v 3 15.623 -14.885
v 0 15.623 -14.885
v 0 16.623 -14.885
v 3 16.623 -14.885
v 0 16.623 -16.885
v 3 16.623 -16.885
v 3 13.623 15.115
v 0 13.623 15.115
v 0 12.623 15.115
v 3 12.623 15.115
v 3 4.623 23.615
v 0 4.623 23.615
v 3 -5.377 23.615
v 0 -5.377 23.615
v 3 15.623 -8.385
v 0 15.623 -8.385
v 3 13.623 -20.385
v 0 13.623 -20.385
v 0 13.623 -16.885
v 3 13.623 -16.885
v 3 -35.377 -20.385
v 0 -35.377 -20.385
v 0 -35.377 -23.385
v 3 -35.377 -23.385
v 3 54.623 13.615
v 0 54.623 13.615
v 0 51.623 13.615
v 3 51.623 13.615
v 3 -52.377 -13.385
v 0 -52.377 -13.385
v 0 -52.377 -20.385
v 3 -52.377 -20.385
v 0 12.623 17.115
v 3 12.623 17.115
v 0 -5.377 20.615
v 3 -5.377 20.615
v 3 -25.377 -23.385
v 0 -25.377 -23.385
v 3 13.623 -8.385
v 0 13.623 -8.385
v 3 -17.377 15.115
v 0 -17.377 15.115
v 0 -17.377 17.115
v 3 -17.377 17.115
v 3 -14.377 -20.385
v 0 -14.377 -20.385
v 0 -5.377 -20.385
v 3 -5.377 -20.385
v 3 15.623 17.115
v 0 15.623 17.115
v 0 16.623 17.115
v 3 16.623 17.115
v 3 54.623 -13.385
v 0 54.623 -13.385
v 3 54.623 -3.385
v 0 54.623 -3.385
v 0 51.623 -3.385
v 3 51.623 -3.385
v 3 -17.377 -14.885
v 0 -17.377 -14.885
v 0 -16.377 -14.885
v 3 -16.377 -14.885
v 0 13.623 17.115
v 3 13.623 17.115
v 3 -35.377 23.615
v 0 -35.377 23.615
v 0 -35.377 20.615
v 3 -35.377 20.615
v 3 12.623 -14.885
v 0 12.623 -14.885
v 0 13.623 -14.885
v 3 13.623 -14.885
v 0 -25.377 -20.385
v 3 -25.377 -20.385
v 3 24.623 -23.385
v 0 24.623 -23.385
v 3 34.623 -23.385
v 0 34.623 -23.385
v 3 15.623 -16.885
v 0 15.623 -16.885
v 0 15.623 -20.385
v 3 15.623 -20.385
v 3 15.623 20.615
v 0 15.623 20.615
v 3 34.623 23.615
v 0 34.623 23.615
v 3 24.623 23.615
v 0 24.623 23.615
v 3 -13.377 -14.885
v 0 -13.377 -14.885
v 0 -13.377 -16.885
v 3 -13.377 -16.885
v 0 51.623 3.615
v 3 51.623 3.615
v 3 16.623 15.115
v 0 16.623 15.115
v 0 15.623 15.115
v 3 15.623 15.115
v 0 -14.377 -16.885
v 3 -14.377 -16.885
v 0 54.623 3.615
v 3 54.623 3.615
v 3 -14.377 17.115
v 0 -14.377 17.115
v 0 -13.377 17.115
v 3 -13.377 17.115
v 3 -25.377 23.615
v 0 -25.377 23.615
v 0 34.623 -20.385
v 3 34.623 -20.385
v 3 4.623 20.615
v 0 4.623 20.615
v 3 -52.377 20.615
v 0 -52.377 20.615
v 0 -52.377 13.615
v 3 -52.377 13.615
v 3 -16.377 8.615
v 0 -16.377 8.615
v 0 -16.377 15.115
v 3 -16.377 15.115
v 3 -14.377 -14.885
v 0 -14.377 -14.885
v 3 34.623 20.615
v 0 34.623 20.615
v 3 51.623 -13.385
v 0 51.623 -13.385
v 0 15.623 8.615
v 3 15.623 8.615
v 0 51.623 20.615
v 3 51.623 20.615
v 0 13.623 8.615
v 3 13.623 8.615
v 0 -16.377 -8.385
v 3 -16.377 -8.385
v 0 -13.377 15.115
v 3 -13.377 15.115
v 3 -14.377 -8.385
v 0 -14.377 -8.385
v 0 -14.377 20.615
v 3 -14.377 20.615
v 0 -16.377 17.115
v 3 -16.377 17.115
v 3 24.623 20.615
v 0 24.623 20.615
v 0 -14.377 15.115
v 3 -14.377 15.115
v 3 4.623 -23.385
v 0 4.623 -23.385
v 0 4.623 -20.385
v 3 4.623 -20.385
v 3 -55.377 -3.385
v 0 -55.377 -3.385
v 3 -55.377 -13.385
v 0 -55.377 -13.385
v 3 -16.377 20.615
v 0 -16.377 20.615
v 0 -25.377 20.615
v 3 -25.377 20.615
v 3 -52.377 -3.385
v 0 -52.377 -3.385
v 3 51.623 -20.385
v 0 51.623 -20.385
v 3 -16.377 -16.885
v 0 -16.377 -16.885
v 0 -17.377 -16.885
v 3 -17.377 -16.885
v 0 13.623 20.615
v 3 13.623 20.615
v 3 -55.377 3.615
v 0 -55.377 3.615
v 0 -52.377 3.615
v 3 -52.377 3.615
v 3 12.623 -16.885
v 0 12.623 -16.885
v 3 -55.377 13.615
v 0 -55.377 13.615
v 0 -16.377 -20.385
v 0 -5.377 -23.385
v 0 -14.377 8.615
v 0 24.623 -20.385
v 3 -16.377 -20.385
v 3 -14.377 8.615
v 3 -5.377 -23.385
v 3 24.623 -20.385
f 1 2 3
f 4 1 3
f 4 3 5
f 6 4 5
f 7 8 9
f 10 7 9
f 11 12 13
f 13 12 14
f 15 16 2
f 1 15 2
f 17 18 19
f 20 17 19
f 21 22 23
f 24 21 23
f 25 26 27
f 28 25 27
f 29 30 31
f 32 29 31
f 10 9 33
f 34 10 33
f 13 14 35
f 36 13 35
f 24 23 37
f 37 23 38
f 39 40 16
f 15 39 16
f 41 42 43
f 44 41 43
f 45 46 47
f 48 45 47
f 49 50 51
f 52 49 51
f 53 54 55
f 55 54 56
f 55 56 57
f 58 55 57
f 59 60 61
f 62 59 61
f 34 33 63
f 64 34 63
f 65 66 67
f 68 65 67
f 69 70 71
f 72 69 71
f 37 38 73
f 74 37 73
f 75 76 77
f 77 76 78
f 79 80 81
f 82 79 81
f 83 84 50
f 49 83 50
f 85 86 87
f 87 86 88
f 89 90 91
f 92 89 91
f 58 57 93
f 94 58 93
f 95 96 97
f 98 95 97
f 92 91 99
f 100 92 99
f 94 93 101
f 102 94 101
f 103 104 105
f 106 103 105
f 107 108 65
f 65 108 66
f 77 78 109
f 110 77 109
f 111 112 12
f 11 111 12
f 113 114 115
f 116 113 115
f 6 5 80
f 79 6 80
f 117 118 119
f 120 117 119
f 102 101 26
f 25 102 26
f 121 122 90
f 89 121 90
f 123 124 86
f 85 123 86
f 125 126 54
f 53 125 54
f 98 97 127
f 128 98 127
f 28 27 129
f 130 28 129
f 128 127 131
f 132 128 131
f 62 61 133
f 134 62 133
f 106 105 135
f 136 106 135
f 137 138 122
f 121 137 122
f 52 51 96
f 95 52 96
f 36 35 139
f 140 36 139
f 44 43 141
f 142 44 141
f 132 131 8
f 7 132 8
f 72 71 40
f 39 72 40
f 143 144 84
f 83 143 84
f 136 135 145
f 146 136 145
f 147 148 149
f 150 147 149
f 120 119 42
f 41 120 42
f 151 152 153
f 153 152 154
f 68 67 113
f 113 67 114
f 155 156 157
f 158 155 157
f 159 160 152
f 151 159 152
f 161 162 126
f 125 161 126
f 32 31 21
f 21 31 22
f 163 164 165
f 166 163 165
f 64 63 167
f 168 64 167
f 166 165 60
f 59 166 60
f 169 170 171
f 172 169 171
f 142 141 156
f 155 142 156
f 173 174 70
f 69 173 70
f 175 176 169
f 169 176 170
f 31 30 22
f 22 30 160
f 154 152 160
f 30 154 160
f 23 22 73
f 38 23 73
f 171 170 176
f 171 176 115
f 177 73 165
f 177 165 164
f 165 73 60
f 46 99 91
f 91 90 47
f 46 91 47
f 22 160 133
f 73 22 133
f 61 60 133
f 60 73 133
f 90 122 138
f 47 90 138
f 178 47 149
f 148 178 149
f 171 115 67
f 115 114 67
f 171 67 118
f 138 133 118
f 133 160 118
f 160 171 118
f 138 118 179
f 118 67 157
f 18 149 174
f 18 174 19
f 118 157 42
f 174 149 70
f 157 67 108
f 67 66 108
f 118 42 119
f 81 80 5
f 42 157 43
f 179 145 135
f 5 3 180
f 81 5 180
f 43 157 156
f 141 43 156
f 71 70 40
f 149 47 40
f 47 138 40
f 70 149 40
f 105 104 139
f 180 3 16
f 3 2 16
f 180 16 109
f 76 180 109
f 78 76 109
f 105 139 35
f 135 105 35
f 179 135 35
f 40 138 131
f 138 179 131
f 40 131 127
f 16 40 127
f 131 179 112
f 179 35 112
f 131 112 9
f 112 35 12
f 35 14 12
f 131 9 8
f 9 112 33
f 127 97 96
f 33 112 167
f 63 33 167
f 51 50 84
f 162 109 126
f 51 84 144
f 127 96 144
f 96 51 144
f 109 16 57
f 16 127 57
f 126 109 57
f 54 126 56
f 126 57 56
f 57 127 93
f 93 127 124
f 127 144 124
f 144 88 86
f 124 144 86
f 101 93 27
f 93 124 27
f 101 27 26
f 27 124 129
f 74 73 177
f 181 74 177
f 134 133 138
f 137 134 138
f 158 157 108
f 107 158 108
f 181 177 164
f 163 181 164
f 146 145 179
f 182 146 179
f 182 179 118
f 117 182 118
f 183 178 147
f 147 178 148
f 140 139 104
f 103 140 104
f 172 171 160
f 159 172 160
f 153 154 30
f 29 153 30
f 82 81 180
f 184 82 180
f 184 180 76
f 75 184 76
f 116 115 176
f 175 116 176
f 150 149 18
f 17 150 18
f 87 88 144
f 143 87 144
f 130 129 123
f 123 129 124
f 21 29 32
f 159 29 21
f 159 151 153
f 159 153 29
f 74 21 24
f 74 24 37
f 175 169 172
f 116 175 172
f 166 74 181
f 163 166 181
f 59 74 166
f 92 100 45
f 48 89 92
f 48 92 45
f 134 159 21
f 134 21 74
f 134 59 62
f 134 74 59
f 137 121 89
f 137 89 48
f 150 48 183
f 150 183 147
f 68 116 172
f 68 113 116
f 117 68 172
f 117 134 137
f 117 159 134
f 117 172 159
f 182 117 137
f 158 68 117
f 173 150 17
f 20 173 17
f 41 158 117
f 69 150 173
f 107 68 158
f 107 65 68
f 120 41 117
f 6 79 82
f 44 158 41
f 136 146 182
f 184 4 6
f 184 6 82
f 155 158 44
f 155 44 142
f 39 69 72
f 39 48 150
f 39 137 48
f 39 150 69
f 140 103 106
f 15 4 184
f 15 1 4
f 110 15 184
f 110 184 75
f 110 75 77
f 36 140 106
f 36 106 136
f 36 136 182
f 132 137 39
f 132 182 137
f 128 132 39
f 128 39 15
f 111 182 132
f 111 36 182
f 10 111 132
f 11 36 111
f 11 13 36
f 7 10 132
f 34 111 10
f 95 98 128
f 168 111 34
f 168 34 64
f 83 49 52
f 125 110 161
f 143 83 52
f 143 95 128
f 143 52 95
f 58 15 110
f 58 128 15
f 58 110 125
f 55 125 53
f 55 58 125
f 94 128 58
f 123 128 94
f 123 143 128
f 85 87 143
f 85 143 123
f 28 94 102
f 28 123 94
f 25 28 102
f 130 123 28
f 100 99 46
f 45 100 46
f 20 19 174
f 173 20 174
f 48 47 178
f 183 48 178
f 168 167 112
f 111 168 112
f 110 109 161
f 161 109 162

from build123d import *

# Parameters (mm, degrees)
F1_DEPTH = 3


with BuildPart() as f1:
    # F0 (on Right) → F1 (new body)
    with BuildSketch(Plane.YZ):
        Polygon((-52.377451, -13.384804), (-52.377451, -20.384804), (-35.377451, -20.384804), (-35.377451, -23.384804), (-25.377451, -23.384804), (-25.377451, -20.384804), (-16.377451, -20.384804), (-16.377451, -16.884804), (-17.377451, -16.884804), (-17.377451, -14.884804), (-16.377451, -14.884804), (-16.377451, -8.384804), (-14.377451, -8.384804), (-14.377451, -14.884804), (-13.377451, -14.884804), (-13.377451, -16.884804), (-14.377451, -16.884804), (-14.377451, -20.384804), (-5.377451, -20.384804), (-5.377451, -23.384804), (-0.377451, -23.384804), (4.622549, -23.384804), (4.622549, -20.384804), (13.622549, -20.384804), (13.622549, -16.884804), (12.622549, -16.884804), (12.622549, -14.884804), (13.622549, -14.884804), (13.622549, -8.384804), (15.622549, -8.384804), (15.622549, -14.884804), (16.622549, -14.884804), (16.622549, -16.884804), (15.622549, -16.884804), (15.622549, -20.384804), (24.622549, -20.384804), (24.622549, -23.384804), (34.622549, -23.384804), (34.622549, -20.384804), (51.622549, -20.384804), (51.622549, -13.384804), (54.622549, -13.384804), (54.622549, -3.384804), (51.622549, -3.384804), (51.622549, 0.115196), (51.622549, 3.615196), (54.622549, 3.615196), (54.622549, 13.615196), (51.622549, 13.615196), (51.622549, 20.615196), (34.622549, 20.615196), (34.622549, 23.615196), (24.622549, 23.615196), (24.622549, 20.615196), (15.622549, 20.615196), (15.622549, 17.115196), (16.622549, 17.115196), (16.622549, 15.115196), (15.622549, 15.115196), (15.622549, 8.615196), (13.622549, 8.615196), (13.622549, 15.115196), (12.622549, 15.115196), (12.622549, 17.115196), (13.622549, 17.115196), (13.622549, 20.615196), (4.622549, 20.615196), (4.622549, 23.615196), (-0.377451, 23.615196), (-5.377451, 23.615196), (-5.377451, 20.615196), (-14.377451, 20.615196), (-14.377451, 17.115196), (-13.377451, 17.115196), (-13.377451, 15.115196), (-14.377451, 15.115196), (-14.377451, 8.615196), (-16.377451, 8.615196), (-16.377451, 15.115196), (-17.377451, 15.115196), (-17.377451, 17.115196), (-16.377451, 17.115196), (-16.377451, 20.615196), (-25.377451, 20.615196), (-25.377451, 23.615196), (-35.377451, 23.615196), (-35.377451, 20.615196), (-52.377451, 20.615196), (-52.377451, 13.615196), (-55.377451, 13.615196), (-55.377451, 3.615196), (-52.377451, 3.615196), (-52.377451, 0.115196), (-52.377451, -3.384804), (-55.377451, -3.384804), (-55.377451, -13.384804), align=None)
    extrude(amount=F1_DEPTH)


solid = f1.part
